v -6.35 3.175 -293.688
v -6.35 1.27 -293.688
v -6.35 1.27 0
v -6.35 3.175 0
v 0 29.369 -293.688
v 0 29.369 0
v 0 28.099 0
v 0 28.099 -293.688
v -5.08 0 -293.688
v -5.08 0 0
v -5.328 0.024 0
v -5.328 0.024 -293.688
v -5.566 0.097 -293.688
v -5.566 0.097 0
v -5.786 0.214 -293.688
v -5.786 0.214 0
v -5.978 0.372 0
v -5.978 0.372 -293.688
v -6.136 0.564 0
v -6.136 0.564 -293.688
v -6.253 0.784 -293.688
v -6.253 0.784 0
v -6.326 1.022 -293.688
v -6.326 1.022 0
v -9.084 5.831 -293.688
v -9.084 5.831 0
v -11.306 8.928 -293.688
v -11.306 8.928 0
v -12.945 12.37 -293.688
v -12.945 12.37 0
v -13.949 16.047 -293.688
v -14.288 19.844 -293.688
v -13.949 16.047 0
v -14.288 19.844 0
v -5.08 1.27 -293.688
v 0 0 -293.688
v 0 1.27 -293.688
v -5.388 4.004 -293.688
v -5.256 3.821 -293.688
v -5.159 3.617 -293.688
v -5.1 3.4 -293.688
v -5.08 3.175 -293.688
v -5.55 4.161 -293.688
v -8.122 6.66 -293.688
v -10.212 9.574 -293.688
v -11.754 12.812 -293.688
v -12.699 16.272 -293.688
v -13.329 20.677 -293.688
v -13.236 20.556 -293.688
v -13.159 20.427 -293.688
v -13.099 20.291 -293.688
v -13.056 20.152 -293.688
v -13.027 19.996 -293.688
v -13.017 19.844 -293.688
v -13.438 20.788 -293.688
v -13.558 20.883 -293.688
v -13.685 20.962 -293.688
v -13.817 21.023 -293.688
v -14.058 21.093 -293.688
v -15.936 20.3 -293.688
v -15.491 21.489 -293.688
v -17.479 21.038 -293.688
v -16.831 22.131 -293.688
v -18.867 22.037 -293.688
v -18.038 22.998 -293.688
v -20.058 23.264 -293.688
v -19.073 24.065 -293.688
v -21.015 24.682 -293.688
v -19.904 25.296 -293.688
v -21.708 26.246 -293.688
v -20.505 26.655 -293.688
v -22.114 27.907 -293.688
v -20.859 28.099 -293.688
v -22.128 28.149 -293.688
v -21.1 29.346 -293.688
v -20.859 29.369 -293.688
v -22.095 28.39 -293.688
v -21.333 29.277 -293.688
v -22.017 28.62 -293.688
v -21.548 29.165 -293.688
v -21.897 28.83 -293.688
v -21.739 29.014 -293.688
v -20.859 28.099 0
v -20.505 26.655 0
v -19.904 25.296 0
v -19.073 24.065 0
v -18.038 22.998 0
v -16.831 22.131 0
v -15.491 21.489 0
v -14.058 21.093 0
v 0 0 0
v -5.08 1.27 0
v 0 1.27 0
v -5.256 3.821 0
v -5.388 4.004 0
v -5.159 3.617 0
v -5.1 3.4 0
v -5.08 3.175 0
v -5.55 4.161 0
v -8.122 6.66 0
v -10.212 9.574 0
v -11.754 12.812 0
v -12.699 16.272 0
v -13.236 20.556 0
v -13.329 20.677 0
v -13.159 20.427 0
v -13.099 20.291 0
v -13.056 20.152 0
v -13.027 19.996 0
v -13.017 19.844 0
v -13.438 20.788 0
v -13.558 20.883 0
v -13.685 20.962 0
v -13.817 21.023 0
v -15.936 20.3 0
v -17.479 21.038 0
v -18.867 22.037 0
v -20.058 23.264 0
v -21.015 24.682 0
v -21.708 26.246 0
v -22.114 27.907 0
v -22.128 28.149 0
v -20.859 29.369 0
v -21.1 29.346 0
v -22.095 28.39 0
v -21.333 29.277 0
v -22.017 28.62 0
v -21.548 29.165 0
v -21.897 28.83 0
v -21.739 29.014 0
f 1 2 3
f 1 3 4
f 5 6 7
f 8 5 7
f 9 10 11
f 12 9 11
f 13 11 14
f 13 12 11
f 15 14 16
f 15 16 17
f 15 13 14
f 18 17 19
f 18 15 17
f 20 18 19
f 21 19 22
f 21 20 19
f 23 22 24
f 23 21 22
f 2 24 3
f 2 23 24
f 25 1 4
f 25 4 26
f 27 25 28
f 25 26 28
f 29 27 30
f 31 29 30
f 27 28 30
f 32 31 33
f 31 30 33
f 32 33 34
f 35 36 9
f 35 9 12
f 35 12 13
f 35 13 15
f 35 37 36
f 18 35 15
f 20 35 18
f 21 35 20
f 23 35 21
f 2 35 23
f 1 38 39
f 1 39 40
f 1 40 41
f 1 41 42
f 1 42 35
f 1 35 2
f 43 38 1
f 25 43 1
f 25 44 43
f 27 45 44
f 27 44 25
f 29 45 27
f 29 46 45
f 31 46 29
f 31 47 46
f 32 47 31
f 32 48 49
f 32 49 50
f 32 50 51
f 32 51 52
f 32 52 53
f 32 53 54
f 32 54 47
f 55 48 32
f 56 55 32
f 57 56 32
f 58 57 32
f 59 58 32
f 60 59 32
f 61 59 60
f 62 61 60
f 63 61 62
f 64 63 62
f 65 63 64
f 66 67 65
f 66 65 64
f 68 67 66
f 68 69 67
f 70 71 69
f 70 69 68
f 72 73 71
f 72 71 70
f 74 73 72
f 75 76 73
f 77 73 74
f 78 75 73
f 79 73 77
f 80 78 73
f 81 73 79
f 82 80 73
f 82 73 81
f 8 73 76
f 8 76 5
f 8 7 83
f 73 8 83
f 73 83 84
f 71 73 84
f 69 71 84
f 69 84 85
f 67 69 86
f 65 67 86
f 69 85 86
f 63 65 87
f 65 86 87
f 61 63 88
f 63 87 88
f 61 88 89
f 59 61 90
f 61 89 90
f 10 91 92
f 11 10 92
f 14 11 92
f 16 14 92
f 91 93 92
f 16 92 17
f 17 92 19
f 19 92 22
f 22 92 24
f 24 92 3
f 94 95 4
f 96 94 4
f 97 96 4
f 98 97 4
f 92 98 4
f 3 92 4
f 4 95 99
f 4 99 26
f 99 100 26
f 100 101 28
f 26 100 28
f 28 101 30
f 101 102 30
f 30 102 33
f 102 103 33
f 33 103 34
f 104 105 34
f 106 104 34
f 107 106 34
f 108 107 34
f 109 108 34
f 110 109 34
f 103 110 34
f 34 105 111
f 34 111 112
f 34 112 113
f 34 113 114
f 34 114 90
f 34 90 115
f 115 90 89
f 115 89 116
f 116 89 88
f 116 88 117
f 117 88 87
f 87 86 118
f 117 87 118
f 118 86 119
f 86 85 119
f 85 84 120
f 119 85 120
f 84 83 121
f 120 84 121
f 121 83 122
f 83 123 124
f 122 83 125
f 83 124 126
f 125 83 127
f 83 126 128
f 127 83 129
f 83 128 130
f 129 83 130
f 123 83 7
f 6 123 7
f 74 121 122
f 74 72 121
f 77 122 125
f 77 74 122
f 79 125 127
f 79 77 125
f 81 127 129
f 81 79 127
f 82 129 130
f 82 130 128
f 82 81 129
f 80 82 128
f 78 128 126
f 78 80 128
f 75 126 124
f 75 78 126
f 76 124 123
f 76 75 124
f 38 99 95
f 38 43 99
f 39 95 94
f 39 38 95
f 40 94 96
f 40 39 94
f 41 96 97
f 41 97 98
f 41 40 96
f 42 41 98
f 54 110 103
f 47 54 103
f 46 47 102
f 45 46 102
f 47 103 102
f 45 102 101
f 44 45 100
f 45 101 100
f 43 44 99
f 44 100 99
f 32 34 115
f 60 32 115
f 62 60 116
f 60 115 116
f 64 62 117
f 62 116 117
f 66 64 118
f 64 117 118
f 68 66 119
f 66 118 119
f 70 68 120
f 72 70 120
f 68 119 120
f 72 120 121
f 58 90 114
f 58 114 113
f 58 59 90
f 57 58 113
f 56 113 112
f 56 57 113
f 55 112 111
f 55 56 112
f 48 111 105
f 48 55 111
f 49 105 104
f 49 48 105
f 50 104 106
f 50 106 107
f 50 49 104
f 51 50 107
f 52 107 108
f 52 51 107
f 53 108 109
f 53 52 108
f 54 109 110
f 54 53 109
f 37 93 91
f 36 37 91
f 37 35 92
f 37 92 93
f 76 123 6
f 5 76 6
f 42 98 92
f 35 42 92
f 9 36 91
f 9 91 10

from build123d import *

# Parameters (mm, degrees)
EXTRUDE_THIN1_DEPTH = 293.6875
FILLET1_R           = 1.27


with BuildPart() as part:
    # Sketch1 → Extrude-Thin1 (new body)
    with BuildSketch(Plane.XY):
        with BuildLine():
            Line((0, 0), (-6.35, 0))
            Line((-6.35, 0), (-6.35, 3.175))
            ThreePointArc((-6.35, 3.175), (-12.201824271, 10.612672966), (-14.2875, 19.84375))
            ThreePointArc((-14.2875, 19.84375), (-19.980512816, 23.16936432), (-22.225, 29.36875))
            Line((-22.225, 29.36875), (0, 29.36875))
            Line((0, 29.36875), (0, 28.09875))
            Line((0, 28.09875), (-20.85859868, 28.09875))
            ThreePointArc((-20.85859868, 28.09875), (-18.190231509, 23.133351298), (-12.986259744, 20.966776697))
            ThreePointArc((-12.986259744, 20.966776697), (-11.166701411, 11.396840635), (-5.08, 3.791149695))
            Line((-5.08, 3.791149695), (-5.08, 1.27))
            Line((-5.08, 1.27), (0, 1.27))
            Line((0, 1.27), (0, 0))
        make_face()
    extrude(amount=-EXTRUDE_THIN1_DEPTH)

    # Fillet1
    fillet1_edges = [part.edges().sort_by_distance(p)[0] for p in [
        (-12.986259744, 20.966776697, -146.84375),
        (-5.08, 3.791149695, -146.84375),
        (-6.35, 0, -146.84375),
        (-22.225, 29.36875, -146.84375),
    ]]
    fillet(fillet1_edges, radius=FILLET1_R)


solid = part.part
